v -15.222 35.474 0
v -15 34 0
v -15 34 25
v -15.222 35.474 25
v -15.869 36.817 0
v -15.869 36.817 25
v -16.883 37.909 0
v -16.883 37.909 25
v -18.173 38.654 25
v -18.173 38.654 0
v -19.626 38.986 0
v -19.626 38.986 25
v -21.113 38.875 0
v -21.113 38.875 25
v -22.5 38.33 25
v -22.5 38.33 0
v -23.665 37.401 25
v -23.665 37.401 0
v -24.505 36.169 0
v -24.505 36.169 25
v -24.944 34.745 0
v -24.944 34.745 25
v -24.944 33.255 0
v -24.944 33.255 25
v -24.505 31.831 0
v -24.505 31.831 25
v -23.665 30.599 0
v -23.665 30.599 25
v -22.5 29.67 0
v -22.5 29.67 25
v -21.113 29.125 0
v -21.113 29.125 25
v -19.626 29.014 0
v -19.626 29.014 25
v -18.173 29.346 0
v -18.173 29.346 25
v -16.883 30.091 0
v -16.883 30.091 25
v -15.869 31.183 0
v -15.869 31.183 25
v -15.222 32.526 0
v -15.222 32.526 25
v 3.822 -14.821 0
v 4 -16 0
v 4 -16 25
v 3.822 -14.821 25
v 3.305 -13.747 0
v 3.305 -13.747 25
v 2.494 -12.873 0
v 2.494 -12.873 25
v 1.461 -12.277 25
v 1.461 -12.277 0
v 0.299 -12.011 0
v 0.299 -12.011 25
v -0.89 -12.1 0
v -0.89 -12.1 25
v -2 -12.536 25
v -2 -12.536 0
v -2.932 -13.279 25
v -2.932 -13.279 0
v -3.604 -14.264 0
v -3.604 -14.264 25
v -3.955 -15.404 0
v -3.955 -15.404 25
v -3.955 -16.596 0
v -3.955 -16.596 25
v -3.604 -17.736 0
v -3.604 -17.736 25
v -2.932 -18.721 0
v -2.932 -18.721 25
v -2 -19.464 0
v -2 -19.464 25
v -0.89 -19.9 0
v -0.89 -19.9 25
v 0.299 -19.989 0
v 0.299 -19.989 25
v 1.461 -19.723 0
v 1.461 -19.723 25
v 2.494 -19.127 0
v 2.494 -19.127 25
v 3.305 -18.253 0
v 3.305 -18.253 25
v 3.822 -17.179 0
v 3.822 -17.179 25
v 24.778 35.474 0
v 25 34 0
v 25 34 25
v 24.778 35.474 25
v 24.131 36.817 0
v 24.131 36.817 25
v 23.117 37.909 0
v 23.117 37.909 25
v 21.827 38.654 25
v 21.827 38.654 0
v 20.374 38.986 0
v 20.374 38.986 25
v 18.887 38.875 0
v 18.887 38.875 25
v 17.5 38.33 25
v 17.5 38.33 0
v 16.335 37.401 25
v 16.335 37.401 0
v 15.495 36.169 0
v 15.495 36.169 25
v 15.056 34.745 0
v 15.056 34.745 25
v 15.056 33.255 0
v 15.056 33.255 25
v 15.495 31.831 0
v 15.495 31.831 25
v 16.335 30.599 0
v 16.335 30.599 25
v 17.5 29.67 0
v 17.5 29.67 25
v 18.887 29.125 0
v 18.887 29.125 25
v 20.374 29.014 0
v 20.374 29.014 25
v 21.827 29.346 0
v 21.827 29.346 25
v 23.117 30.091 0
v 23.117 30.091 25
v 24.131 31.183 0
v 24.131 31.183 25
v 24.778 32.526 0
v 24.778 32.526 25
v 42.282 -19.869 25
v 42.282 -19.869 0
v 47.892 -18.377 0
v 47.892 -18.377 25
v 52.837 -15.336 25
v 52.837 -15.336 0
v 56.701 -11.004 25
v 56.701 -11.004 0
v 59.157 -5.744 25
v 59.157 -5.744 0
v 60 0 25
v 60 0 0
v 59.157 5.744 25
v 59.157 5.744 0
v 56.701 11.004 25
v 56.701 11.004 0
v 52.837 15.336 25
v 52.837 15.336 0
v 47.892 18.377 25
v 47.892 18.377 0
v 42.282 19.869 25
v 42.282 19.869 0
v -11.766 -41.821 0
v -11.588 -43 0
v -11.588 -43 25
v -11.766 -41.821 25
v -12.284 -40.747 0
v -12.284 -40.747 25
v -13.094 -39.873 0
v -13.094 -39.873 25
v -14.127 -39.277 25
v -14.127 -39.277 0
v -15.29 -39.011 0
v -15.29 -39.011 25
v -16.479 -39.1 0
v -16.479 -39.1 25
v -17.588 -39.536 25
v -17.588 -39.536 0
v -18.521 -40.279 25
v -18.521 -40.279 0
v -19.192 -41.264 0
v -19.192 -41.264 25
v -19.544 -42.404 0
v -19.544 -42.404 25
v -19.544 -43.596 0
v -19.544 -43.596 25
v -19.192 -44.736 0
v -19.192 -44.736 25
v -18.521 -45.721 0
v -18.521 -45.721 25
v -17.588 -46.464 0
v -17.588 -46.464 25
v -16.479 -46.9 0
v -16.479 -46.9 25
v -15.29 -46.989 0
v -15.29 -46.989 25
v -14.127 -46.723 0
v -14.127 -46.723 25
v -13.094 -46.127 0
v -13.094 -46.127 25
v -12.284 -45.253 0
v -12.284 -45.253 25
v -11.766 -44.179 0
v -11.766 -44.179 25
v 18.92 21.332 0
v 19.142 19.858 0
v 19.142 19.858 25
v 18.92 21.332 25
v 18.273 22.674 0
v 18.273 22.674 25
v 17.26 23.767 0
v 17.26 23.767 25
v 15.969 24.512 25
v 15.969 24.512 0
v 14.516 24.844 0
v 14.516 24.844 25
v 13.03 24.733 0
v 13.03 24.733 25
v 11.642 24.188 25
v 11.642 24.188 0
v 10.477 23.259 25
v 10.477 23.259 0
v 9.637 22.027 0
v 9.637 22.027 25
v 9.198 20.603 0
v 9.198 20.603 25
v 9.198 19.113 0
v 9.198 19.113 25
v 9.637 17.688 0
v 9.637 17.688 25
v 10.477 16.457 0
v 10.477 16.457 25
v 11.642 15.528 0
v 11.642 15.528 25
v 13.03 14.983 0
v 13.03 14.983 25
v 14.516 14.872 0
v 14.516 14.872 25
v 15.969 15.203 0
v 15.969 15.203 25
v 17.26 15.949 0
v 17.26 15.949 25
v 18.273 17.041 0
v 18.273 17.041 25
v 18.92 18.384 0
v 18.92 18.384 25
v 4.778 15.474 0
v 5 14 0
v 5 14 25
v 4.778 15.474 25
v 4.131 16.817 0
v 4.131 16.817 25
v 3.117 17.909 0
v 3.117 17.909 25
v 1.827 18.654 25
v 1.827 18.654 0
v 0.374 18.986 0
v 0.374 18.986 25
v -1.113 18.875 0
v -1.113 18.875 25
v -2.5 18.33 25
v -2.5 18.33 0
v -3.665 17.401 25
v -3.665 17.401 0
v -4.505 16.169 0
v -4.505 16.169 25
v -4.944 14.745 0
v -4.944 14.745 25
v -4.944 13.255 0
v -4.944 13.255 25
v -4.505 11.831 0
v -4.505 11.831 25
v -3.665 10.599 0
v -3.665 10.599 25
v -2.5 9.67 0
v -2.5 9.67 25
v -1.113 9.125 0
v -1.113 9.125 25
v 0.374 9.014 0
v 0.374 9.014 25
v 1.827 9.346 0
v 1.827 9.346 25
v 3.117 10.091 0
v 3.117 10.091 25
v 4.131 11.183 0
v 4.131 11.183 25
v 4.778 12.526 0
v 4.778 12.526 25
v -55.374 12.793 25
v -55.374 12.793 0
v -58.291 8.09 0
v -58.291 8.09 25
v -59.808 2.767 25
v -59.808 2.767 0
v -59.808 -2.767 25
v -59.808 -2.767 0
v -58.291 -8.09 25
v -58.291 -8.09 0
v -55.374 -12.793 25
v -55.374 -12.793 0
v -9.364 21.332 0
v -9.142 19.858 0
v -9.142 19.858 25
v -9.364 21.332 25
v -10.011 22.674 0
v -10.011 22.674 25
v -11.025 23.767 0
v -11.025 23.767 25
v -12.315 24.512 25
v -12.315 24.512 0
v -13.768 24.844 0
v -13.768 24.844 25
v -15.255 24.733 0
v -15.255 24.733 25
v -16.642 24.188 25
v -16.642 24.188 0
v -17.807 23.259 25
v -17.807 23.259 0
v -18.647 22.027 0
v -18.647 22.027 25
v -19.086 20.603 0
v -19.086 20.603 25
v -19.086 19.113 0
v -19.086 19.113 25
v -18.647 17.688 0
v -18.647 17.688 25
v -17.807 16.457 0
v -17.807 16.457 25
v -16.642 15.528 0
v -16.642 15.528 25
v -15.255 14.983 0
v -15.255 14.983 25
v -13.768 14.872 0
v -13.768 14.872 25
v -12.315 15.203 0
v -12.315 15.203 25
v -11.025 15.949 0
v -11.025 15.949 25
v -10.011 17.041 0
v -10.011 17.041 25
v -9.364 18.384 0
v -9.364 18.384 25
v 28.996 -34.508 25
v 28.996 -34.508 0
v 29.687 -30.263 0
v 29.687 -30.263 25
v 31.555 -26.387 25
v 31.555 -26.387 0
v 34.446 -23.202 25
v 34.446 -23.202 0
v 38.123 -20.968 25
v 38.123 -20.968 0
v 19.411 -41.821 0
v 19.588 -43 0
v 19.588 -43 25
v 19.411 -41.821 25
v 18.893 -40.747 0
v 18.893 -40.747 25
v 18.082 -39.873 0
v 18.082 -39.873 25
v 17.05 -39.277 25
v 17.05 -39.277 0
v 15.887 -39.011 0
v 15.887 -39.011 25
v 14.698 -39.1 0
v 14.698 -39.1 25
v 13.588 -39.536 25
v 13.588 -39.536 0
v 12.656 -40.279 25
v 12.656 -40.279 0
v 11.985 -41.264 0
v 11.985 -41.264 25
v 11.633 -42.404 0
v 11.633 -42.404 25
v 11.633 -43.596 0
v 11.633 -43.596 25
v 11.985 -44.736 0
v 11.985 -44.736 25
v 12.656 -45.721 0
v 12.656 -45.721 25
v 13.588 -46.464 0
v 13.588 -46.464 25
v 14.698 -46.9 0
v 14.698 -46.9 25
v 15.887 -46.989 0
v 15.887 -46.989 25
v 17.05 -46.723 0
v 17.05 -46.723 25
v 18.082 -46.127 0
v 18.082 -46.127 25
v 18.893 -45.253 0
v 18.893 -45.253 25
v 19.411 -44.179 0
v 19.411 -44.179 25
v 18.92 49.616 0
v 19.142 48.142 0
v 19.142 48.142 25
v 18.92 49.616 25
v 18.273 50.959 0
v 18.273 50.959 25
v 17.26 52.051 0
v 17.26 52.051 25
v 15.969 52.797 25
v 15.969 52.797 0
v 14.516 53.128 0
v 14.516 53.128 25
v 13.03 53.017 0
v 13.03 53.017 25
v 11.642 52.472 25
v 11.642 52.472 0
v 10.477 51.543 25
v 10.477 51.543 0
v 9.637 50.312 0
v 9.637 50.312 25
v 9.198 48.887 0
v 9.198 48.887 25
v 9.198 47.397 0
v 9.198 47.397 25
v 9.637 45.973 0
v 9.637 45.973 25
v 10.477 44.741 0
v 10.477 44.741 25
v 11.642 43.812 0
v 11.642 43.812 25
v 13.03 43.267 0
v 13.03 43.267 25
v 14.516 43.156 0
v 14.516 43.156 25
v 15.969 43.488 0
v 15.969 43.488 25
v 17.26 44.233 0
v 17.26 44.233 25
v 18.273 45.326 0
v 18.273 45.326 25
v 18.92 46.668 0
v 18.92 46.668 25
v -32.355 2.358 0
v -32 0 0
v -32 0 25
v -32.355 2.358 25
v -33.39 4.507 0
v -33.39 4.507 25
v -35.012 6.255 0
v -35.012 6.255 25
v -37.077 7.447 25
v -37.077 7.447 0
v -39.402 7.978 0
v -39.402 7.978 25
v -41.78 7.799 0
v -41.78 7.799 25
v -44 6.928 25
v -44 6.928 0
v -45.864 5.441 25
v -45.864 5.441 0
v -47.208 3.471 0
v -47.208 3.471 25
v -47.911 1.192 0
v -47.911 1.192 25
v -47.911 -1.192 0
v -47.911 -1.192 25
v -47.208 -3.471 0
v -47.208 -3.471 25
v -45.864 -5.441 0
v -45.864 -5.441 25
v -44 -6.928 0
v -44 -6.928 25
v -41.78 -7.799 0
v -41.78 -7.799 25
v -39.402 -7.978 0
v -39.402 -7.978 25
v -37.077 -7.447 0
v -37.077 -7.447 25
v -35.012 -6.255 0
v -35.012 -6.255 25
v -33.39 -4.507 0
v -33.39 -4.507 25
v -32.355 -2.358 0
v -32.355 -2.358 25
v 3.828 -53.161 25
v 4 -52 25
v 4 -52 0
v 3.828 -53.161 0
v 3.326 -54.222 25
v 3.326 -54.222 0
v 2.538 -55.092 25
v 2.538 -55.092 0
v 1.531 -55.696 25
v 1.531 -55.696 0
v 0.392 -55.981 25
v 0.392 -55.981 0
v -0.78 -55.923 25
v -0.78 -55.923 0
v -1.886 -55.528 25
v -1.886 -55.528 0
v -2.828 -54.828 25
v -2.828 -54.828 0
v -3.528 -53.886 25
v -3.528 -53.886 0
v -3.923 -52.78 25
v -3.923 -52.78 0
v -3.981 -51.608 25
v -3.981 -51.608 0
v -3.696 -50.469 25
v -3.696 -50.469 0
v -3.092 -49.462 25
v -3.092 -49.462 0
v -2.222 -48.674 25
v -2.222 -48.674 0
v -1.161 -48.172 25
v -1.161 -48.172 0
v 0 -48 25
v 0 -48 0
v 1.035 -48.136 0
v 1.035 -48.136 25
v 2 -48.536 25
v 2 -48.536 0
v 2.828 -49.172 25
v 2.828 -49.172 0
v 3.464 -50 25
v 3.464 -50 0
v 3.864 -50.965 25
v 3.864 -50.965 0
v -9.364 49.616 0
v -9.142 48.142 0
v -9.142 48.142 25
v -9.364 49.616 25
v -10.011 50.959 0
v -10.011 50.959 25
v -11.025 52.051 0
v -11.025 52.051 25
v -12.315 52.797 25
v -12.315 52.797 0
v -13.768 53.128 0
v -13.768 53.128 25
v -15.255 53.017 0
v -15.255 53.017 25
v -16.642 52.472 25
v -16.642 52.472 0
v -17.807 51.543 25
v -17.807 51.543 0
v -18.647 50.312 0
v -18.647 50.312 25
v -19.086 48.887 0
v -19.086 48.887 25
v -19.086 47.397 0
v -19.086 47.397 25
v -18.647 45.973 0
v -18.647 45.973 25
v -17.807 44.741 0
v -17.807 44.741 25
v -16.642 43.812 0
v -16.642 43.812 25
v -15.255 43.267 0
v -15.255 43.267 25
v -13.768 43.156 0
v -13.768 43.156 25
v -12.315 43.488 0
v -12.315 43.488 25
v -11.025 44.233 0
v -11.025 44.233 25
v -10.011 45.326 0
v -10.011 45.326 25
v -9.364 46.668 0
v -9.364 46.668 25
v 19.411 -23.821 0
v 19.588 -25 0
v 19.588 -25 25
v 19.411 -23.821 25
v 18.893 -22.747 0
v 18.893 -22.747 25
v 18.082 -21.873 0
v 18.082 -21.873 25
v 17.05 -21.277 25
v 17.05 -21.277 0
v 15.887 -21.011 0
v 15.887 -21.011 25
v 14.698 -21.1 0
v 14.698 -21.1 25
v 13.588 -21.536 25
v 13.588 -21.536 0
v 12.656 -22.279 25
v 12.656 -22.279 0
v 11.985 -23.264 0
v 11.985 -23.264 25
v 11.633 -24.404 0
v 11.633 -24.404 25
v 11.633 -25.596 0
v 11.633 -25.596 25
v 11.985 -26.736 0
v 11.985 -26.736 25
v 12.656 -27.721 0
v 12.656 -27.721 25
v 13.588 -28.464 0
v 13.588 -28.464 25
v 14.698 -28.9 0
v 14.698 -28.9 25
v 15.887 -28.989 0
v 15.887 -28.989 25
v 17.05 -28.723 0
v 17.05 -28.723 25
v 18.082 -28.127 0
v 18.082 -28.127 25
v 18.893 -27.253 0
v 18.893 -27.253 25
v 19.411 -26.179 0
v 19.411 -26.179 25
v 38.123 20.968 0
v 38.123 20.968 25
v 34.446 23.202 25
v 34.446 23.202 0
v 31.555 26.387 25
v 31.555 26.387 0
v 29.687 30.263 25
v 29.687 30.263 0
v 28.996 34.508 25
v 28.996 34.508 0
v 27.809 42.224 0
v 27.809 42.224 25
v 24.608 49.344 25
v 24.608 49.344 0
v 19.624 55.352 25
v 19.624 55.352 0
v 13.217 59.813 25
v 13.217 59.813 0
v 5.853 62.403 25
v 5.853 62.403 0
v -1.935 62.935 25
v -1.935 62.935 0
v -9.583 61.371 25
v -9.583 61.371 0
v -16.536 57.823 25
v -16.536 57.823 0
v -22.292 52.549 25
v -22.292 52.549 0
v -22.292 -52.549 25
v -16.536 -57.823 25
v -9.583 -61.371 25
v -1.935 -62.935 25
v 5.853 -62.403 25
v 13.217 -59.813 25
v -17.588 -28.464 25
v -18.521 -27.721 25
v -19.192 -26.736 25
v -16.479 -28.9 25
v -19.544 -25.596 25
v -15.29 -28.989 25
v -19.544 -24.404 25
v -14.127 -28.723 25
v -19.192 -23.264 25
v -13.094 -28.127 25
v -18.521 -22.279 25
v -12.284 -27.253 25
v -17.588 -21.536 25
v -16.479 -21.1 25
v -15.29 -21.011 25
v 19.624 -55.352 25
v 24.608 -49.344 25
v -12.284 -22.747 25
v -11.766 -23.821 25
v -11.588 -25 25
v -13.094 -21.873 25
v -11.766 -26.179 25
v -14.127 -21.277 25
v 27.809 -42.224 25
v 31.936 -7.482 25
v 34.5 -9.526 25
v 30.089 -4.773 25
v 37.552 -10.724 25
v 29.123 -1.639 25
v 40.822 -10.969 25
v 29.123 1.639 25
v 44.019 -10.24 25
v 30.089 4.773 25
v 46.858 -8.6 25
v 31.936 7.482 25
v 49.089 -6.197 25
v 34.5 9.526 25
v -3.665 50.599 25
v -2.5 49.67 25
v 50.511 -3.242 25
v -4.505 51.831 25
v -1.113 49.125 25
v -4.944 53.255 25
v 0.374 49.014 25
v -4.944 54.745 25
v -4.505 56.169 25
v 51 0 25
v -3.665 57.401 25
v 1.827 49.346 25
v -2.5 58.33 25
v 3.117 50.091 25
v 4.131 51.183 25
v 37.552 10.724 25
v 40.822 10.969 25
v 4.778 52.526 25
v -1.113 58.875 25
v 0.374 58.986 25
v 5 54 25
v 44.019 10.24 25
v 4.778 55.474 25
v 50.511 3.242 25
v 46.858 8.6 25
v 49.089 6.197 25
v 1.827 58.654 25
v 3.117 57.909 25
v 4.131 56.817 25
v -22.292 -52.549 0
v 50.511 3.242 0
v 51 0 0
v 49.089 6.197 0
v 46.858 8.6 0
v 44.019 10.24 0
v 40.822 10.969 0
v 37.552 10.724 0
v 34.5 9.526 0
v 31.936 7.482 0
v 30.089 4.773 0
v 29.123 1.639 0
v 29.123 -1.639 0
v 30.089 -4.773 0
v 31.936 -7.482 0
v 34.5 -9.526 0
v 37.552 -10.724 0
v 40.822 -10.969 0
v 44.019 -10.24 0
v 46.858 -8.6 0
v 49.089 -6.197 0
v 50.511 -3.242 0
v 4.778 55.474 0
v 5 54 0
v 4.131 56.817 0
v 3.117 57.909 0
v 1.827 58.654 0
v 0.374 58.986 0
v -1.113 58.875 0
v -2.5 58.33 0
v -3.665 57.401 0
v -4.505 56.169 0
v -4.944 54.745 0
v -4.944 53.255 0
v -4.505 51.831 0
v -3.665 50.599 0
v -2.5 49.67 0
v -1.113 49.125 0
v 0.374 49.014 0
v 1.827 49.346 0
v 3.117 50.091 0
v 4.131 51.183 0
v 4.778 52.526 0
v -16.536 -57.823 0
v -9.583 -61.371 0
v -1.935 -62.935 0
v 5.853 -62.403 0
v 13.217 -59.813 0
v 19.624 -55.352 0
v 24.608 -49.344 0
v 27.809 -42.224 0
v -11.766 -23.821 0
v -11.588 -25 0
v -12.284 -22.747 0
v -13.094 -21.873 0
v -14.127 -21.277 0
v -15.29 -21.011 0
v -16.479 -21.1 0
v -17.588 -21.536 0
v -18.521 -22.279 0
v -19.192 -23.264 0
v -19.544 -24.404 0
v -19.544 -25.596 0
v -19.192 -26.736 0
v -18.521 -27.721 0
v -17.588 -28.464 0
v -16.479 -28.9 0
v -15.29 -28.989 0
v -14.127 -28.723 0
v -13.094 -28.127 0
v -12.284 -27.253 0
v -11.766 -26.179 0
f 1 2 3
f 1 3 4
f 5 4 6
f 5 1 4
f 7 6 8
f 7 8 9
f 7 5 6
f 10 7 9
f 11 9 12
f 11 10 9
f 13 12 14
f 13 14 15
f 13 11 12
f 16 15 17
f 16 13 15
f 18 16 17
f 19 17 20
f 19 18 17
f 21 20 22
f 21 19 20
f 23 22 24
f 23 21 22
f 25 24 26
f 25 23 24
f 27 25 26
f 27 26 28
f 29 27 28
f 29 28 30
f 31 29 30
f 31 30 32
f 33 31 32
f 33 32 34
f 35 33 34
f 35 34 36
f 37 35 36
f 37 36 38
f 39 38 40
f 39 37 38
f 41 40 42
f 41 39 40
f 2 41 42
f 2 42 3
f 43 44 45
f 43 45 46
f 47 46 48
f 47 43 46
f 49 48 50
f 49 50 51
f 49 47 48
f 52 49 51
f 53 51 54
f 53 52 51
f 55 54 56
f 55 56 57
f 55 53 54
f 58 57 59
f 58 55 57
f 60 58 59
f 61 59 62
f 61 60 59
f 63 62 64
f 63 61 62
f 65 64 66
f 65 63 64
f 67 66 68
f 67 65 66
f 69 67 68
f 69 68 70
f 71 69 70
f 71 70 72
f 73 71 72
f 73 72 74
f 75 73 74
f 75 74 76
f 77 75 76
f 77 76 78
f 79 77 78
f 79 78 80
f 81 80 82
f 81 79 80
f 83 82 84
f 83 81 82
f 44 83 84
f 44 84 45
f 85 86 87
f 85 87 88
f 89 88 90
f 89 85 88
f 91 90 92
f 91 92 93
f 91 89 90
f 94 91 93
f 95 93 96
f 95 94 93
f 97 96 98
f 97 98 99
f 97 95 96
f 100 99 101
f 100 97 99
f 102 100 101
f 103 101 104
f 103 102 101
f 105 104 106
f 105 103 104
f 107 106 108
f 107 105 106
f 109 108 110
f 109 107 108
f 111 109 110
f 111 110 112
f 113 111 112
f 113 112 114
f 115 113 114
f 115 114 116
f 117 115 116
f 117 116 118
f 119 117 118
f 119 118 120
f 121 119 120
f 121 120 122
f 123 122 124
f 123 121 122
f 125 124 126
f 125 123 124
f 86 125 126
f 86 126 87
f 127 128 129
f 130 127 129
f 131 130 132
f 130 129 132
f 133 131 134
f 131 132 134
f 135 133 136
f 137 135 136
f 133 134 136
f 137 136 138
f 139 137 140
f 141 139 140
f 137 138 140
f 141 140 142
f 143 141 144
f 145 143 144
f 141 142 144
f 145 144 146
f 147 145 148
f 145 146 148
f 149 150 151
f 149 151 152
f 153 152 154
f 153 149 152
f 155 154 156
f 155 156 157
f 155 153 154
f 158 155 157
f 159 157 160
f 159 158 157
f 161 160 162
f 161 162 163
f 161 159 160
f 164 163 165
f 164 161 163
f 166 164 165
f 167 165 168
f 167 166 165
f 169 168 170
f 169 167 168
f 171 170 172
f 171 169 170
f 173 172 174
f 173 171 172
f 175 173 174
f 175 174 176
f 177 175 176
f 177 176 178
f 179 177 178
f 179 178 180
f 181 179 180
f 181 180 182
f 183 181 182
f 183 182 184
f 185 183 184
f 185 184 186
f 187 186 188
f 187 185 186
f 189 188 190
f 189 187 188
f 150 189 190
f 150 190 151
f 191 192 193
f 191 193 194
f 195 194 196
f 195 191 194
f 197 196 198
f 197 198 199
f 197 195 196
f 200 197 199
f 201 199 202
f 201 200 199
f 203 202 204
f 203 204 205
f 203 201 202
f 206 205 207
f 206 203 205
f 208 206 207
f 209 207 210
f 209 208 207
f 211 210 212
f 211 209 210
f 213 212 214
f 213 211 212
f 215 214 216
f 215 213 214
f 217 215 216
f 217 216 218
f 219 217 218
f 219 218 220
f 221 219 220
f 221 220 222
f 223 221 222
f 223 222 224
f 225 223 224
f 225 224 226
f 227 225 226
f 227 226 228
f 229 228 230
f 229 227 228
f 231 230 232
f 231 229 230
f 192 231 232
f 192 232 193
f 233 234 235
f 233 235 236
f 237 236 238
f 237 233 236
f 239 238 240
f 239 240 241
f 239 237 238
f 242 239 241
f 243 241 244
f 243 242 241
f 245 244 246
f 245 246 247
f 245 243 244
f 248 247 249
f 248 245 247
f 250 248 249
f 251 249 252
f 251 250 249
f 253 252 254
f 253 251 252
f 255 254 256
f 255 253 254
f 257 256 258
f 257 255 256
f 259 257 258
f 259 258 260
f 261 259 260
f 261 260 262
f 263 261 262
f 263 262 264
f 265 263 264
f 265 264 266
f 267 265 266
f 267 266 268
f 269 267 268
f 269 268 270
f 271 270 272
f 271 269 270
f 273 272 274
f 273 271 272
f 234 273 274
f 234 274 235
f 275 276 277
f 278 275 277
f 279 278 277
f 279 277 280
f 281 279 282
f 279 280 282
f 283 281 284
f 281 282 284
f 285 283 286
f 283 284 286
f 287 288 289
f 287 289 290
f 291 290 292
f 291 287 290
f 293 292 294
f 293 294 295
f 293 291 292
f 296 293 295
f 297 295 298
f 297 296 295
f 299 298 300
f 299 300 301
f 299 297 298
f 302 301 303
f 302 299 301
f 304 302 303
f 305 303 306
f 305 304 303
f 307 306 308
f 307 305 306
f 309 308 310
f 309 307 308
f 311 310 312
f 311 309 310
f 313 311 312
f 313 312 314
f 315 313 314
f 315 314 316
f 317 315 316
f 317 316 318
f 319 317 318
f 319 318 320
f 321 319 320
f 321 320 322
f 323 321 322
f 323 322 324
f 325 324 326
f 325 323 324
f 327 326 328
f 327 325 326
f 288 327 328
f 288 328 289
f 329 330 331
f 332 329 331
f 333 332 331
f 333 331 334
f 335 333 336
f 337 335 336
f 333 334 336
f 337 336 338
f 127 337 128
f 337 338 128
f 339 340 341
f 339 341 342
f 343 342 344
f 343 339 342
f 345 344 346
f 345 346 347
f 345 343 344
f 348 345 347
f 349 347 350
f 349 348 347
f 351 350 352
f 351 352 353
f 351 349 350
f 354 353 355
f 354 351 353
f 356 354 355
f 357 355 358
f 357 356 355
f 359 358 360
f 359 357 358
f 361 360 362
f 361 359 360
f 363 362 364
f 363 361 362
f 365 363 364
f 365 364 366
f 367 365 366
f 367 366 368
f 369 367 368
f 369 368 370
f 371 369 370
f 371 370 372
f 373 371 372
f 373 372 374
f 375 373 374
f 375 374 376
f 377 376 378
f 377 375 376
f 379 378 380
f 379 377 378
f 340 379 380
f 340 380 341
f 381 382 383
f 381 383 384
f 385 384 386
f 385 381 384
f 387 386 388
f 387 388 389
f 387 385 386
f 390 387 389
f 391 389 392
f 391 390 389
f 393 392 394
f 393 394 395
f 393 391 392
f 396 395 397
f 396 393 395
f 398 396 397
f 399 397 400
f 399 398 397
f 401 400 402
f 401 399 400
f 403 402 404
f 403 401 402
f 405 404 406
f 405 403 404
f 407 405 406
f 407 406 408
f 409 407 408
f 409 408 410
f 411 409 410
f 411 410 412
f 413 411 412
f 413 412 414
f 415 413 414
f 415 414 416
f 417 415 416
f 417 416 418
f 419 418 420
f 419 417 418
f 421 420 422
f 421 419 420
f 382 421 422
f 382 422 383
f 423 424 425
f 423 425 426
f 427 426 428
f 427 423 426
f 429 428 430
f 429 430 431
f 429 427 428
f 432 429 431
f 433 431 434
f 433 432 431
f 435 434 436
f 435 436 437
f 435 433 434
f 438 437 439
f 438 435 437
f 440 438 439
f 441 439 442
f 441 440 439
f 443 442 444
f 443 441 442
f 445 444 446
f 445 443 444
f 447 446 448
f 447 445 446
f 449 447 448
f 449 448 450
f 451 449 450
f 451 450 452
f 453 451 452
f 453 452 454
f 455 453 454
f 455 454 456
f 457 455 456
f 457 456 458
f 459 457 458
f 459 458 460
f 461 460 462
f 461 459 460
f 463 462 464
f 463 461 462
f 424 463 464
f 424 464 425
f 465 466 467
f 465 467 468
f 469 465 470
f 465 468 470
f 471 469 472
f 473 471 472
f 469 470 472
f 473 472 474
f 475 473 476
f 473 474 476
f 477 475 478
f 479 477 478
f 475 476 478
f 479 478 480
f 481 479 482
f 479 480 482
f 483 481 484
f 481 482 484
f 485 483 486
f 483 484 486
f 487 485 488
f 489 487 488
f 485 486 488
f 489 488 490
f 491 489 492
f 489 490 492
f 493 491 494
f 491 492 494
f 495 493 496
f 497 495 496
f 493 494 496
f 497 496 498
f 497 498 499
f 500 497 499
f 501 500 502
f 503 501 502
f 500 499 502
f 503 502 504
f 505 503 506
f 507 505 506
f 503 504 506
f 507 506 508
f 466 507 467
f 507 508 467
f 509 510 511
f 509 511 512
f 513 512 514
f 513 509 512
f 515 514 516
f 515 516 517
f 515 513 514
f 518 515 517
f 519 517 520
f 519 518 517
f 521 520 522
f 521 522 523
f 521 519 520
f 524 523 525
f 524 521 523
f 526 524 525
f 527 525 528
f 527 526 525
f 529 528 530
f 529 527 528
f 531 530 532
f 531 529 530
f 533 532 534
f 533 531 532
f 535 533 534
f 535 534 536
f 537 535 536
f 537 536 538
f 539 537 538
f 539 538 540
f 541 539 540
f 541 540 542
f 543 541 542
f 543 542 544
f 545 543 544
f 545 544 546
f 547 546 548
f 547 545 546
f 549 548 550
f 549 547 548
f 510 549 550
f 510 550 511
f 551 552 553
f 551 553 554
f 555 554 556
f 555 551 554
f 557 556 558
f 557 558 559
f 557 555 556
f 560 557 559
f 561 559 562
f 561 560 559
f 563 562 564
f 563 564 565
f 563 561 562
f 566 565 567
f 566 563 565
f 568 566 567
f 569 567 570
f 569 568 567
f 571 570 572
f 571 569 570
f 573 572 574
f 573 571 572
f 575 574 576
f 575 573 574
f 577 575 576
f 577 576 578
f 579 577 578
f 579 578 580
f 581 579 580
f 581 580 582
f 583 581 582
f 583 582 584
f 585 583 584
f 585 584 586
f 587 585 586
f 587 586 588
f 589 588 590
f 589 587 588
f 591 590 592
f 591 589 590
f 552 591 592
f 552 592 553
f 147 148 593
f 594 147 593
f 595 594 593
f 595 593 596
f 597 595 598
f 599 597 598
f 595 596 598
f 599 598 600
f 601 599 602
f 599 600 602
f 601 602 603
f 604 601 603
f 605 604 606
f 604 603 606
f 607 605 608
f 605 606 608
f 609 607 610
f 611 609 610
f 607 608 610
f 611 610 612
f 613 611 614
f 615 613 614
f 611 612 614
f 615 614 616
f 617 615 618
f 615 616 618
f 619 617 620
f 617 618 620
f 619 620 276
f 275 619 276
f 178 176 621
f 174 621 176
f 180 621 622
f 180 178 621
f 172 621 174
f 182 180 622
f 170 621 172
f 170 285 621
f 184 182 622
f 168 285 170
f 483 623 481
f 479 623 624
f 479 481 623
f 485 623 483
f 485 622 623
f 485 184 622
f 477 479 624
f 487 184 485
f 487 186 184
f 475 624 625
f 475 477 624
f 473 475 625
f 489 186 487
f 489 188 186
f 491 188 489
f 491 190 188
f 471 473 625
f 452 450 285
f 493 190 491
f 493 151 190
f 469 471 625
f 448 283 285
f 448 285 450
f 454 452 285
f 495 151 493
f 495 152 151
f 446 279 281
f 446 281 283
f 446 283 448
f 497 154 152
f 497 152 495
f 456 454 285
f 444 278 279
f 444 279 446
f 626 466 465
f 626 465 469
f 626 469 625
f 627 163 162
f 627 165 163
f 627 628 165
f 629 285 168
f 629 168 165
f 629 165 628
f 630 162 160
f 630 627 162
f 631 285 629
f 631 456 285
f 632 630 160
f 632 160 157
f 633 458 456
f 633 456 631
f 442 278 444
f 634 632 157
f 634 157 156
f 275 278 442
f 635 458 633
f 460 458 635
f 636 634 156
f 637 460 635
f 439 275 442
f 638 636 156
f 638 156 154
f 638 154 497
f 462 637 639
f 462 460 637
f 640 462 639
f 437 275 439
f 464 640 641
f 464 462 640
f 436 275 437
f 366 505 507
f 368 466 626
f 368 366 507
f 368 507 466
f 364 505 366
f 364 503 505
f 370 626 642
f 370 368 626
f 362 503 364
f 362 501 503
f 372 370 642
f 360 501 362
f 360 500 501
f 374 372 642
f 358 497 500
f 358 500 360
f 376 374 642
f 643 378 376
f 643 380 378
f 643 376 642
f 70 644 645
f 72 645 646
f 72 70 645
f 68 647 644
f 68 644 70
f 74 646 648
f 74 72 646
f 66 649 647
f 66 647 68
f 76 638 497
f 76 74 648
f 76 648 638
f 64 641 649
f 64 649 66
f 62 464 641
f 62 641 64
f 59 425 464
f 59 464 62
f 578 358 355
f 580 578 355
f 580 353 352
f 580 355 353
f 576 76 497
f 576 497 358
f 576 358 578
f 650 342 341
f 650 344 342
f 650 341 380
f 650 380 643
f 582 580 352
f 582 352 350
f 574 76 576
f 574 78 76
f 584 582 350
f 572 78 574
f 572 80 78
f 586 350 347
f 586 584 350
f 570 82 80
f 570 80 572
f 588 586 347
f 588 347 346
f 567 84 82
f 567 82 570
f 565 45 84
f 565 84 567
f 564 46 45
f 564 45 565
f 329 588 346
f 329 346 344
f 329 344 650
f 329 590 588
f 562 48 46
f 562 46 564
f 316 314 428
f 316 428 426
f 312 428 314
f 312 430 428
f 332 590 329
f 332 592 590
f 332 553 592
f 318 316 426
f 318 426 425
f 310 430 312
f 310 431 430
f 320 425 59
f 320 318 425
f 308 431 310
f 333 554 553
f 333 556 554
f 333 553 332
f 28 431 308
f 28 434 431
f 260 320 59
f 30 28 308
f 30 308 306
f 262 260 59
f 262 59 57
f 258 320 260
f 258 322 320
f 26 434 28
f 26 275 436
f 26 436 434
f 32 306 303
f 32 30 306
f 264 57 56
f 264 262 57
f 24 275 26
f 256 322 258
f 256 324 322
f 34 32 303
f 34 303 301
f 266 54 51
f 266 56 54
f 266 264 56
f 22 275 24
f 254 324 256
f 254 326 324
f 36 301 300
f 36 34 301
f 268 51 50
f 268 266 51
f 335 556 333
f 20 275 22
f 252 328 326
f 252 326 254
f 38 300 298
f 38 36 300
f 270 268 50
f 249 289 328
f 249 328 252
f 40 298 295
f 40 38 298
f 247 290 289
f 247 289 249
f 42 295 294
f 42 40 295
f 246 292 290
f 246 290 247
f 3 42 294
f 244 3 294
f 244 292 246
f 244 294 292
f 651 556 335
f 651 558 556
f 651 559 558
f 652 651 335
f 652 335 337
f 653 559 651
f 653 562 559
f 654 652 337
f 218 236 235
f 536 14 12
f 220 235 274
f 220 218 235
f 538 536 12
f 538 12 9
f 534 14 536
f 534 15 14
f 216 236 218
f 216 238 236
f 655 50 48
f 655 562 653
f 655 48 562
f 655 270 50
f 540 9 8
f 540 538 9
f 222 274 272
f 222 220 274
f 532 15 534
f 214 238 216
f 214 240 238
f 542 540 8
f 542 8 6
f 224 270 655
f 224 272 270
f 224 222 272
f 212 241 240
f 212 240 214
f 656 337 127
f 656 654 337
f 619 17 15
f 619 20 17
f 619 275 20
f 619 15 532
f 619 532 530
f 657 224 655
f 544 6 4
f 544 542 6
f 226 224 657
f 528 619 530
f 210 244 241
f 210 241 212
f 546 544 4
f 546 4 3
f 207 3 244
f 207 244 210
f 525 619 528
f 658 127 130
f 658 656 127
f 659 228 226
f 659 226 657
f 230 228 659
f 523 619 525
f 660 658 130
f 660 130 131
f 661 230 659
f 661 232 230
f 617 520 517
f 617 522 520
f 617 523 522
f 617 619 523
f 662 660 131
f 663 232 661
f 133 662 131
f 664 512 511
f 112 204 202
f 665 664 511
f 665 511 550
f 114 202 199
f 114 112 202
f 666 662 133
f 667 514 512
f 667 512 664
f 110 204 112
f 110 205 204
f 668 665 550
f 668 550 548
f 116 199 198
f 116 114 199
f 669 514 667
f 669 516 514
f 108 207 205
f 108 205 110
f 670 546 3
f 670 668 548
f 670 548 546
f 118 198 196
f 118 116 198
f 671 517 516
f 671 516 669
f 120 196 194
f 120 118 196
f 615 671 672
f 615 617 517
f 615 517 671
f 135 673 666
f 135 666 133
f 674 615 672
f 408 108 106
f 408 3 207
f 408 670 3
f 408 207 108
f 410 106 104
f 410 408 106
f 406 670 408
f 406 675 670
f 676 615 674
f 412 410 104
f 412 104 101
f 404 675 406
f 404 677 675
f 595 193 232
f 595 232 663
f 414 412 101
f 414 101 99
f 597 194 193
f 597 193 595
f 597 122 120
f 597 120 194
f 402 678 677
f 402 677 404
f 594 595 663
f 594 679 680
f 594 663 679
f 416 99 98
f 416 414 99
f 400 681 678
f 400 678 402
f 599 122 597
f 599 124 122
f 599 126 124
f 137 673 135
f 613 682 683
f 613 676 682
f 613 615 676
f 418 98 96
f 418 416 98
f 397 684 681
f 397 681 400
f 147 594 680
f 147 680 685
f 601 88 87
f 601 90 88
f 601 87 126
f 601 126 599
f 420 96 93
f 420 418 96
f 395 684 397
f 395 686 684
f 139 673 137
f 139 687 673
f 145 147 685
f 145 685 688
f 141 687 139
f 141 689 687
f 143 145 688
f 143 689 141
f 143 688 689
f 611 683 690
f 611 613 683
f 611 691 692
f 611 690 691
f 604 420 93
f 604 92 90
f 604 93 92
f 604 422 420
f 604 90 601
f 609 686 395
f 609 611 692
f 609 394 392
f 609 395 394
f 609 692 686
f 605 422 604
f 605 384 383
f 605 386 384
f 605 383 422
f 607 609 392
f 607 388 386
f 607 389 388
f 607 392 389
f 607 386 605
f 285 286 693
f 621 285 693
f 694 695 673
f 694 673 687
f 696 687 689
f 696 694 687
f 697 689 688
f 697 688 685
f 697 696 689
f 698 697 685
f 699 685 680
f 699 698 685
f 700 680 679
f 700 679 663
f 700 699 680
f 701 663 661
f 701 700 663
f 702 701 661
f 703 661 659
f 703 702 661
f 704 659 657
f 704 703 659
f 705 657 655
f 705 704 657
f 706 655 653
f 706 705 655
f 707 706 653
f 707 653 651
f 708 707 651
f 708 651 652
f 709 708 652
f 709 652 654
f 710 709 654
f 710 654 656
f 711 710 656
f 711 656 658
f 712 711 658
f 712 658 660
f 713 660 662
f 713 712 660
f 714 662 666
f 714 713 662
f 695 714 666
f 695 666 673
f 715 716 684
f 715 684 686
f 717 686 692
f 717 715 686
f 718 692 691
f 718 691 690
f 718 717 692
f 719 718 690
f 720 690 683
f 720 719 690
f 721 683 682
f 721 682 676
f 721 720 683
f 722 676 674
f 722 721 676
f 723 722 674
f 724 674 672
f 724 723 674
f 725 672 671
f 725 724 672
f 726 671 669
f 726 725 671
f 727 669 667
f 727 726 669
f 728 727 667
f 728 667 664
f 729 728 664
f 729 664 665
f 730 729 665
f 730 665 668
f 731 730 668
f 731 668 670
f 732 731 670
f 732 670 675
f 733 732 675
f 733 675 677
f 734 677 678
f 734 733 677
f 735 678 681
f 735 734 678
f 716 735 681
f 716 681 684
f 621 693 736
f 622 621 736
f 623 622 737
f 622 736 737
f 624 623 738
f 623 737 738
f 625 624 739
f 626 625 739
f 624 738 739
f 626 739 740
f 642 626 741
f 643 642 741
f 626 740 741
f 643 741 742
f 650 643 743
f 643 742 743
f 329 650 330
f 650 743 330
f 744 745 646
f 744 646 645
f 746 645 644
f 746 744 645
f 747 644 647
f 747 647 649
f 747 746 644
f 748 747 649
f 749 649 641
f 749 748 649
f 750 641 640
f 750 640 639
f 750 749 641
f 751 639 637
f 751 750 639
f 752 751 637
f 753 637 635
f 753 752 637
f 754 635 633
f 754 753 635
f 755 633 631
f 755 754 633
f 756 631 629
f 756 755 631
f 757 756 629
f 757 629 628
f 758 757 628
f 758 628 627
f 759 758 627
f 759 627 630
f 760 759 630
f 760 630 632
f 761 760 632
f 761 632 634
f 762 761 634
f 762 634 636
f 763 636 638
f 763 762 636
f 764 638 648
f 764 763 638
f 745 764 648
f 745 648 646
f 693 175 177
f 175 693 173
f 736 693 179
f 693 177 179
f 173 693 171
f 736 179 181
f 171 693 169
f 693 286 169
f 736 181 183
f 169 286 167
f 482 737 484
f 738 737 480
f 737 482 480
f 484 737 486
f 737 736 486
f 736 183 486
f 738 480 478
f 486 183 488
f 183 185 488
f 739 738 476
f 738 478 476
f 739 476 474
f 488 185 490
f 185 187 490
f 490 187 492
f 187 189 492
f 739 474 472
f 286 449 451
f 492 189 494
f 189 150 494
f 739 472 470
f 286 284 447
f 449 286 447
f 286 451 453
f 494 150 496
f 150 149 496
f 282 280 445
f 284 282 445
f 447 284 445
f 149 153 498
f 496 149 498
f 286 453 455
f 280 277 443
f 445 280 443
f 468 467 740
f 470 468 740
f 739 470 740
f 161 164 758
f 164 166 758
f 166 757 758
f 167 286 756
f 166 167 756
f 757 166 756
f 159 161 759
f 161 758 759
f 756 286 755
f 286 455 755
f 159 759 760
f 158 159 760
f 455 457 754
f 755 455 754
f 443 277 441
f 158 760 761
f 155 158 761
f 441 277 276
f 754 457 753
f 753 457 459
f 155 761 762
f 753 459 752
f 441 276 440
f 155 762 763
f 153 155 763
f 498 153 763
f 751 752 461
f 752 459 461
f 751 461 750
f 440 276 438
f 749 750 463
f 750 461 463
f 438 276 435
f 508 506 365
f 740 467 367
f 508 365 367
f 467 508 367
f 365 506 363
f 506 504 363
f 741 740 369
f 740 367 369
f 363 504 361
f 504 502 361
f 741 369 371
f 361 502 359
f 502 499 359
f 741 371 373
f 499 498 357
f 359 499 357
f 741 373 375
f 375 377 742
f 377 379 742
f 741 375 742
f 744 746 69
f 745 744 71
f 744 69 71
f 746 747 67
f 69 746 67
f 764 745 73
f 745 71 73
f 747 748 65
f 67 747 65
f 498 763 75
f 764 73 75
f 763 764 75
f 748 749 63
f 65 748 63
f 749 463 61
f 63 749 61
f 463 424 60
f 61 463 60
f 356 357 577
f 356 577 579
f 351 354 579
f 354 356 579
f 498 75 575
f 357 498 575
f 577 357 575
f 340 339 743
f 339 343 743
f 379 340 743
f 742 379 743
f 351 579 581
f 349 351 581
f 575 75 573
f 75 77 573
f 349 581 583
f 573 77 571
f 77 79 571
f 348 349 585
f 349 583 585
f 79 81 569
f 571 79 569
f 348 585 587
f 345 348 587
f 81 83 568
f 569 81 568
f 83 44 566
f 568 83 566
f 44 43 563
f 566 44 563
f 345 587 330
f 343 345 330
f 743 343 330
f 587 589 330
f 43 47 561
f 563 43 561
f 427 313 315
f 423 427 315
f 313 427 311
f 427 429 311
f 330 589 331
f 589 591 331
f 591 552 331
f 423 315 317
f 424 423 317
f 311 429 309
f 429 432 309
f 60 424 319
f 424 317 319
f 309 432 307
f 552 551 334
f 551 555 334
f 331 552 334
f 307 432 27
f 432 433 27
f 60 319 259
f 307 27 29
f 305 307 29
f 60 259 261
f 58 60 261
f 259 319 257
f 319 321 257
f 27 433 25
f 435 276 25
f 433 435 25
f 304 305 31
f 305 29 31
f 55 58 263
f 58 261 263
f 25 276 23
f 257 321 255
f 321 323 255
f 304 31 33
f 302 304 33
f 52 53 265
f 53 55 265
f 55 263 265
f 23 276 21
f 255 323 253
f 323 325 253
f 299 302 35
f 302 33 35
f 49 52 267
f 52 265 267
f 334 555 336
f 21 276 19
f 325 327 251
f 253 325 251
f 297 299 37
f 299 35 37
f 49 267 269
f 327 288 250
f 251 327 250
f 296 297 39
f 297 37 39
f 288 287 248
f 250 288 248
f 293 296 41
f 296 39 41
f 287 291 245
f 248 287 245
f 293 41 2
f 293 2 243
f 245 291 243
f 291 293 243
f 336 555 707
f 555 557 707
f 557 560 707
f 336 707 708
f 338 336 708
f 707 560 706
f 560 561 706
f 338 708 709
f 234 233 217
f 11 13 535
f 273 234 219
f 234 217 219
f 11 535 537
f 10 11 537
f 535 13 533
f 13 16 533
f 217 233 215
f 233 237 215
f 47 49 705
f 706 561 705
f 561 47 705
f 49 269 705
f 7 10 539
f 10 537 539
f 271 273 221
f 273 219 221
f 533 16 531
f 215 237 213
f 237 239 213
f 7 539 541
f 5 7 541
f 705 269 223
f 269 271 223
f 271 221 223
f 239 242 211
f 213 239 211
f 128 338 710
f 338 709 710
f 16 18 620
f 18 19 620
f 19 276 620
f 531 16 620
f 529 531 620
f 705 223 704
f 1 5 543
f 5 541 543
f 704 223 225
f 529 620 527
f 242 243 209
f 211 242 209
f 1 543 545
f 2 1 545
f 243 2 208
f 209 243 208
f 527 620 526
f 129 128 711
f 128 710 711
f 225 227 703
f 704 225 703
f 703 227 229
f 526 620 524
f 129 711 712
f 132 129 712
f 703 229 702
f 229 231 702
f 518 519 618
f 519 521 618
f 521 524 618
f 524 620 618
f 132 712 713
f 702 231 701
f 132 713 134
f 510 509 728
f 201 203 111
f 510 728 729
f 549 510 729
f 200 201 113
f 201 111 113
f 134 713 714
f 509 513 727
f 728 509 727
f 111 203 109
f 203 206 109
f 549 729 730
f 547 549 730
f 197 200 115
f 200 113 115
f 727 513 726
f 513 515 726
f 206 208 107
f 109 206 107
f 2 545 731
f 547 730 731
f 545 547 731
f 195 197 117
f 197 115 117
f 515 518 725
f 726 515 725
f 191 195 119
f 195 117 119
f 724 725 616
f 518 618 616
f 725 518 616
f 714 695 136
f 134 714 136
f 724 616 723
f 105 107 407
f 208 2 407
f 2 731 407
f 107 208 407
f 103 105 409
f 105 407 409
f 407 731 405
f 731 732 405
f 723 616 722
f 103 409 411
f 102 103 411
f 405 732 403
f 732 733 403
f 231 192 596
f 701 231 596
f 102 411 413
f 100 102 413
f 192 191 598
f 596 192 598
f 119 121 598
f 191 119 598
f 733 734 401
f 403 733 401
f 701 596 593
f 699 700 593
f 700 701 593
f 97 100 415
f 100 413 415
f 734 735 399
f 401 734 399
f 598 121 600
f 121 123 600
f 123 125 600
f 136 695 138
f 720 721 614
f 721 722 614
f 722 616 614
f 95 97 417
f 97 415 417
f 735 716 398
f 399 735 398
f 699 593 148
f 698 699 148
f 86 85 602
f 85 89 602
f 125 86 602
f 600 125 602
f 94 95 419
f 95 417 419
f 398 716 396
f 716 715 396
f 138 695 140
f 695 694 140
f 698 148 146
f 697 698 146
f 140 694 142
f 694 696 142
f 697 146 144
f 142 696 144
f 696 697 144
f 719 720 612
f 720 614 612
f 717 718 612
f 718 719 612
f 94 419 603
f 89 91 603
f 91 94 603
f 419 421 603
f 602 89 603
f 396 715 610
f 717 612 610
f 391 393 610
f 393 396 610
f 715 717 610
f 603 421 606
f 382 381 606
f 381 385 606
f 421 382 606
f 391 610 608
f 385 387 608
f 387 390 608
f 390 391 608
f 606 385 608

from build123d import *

# Parameters (mm, degrees)
F0_R     = 8
F0_R_2   = 11
F0_R_3   = 4
F0_R_4   = 5
F1_DEPTH = 25


with BuildPart() as f1:
    # F0 (on Top) → F1 (new body)
    with BuildSketch(Plane.XY):
        with BuildLine():
            ThreePointArc((28.995542, 34.508459), (28.998886, 34.254239), (29, 34))
            ThreePointArc((29, 34), (-9.862469, 6.728555), (-22.291842, 52.549226))
            Line((-22.291842, 52.549226), (-55.373684, 12.79257))
            ThreePointArc((-55.373684, 12.79257), (-60, 0), (-55.373684, -12.79257))
            Line((-55.373684, -12.79257), (-22.291842, -52.549226))
            ThreePointArc((-22.291842, -52.549226), (-9.862469, -6.728555), (29, -34))
            ThreePointArc((29, -34), (28.998886, -34.254239), (28.995542, -34.508459))
            ThreePointArc((28.995542, -34.508459), (32.885859, -24.690475), (42.281849, -19.869403))
            ThreePointArc((42.281849, -19.869403), (60, 0), (42.281849, 19.869403))
            ThreePointArc((42.281849, 19.869403), (32.885859, 24.690475), (28.995542, 34.508459))
        make_face()
        with Locations((-40, 0)):
            Circle(F0_R, mode=Mode.SUBTRACT)
        with Locations((40, 0)):
            Circle(F0_R_2, mode=Mode.SUBTRACT)
        with BuildLine():
            ThreePointArc((-22.291842, -52.549226), (9.623005, -61.35686), (28.995542, -34.508459))
            ThreePointArc((28.995542, -34.508459), (28.998886, -34.254239), (29, -34))
            ThreePointArc((29, -34), (-9.862469, -6.728555), (-22.291842, -52.549226))
        make_face()
        with Locations((-15.588457, -43)):
            Circle(F0_R_3, mode=Mode.SUBTRACT)
        with Locations((-15.588457, -25)):
            Circle(F0_R_3, mode=Mode.SUBTRACT)
        with BuildLine():
            ThreePointArc((0, -48), (2.828427, -49.171573), (4, -52))
            ThreePointArc((4, -52), (-2.828427, -54.828427), (0, -48))
        make_face(mode=Mode.SUBTRACT)
        with Locations((15.588457, -43)):
            Circle(F0_R_3, mode=Mode.SUBTRACT)
        with Locations((0, -16)):
            Circle(F0_R_3, mode=Mode.SUBTRACT)
        with Locations((15.588457, -25)):
            Circle(F0_R_3, mode=Mode.SUBTRACT)
        with BuildLine():
            ThreePointArc((-22.291842, 52.549226), (-9.862469, 6.728555), (29, 34))
            ThreePointArc((29, 34), (28.998886, 34.254239), (28.995542, 34.508459))
            ThreePointArc((28.995542, 34.508459), (9.623005, 61.35686), (-22.291842, 52.549226))
        make_face()
        with Locations((-14.142136, 19.857864)):
            Circle(F0_R_4, mode=Mode.SUBTRACT)
        with Locations((-20, 34)):
            Circle(F0_R_4, mode=Mode.SUBTRACT)
        with Locations((-14.142136, 48.142136)):
            Circle(F0_R_4, mode=Mode.SUBTRACT)
        with Locations((0, 14)):
            Circle(F0_R_4, mode=Mode.SUBTRACT)
        with Locations((14.142136, 19.857864)):
            Circle(F0_R_4, mode=Mode.SUBTRACT)
        with Locations((20, 34)):
            Circle(F0_R_4, mode=Mode.SUBTRACT)
        with Locations((0, 54)):
            Circle(F0_R_4, mode=Mode.SUBTRACT)
        with Locations((14.142136, 48.142136)):
            Circle(F0_R_4, mode=Mode.SUBTRACT)
    extrude(amount=F1_DEPTH)


solid = f1.part
